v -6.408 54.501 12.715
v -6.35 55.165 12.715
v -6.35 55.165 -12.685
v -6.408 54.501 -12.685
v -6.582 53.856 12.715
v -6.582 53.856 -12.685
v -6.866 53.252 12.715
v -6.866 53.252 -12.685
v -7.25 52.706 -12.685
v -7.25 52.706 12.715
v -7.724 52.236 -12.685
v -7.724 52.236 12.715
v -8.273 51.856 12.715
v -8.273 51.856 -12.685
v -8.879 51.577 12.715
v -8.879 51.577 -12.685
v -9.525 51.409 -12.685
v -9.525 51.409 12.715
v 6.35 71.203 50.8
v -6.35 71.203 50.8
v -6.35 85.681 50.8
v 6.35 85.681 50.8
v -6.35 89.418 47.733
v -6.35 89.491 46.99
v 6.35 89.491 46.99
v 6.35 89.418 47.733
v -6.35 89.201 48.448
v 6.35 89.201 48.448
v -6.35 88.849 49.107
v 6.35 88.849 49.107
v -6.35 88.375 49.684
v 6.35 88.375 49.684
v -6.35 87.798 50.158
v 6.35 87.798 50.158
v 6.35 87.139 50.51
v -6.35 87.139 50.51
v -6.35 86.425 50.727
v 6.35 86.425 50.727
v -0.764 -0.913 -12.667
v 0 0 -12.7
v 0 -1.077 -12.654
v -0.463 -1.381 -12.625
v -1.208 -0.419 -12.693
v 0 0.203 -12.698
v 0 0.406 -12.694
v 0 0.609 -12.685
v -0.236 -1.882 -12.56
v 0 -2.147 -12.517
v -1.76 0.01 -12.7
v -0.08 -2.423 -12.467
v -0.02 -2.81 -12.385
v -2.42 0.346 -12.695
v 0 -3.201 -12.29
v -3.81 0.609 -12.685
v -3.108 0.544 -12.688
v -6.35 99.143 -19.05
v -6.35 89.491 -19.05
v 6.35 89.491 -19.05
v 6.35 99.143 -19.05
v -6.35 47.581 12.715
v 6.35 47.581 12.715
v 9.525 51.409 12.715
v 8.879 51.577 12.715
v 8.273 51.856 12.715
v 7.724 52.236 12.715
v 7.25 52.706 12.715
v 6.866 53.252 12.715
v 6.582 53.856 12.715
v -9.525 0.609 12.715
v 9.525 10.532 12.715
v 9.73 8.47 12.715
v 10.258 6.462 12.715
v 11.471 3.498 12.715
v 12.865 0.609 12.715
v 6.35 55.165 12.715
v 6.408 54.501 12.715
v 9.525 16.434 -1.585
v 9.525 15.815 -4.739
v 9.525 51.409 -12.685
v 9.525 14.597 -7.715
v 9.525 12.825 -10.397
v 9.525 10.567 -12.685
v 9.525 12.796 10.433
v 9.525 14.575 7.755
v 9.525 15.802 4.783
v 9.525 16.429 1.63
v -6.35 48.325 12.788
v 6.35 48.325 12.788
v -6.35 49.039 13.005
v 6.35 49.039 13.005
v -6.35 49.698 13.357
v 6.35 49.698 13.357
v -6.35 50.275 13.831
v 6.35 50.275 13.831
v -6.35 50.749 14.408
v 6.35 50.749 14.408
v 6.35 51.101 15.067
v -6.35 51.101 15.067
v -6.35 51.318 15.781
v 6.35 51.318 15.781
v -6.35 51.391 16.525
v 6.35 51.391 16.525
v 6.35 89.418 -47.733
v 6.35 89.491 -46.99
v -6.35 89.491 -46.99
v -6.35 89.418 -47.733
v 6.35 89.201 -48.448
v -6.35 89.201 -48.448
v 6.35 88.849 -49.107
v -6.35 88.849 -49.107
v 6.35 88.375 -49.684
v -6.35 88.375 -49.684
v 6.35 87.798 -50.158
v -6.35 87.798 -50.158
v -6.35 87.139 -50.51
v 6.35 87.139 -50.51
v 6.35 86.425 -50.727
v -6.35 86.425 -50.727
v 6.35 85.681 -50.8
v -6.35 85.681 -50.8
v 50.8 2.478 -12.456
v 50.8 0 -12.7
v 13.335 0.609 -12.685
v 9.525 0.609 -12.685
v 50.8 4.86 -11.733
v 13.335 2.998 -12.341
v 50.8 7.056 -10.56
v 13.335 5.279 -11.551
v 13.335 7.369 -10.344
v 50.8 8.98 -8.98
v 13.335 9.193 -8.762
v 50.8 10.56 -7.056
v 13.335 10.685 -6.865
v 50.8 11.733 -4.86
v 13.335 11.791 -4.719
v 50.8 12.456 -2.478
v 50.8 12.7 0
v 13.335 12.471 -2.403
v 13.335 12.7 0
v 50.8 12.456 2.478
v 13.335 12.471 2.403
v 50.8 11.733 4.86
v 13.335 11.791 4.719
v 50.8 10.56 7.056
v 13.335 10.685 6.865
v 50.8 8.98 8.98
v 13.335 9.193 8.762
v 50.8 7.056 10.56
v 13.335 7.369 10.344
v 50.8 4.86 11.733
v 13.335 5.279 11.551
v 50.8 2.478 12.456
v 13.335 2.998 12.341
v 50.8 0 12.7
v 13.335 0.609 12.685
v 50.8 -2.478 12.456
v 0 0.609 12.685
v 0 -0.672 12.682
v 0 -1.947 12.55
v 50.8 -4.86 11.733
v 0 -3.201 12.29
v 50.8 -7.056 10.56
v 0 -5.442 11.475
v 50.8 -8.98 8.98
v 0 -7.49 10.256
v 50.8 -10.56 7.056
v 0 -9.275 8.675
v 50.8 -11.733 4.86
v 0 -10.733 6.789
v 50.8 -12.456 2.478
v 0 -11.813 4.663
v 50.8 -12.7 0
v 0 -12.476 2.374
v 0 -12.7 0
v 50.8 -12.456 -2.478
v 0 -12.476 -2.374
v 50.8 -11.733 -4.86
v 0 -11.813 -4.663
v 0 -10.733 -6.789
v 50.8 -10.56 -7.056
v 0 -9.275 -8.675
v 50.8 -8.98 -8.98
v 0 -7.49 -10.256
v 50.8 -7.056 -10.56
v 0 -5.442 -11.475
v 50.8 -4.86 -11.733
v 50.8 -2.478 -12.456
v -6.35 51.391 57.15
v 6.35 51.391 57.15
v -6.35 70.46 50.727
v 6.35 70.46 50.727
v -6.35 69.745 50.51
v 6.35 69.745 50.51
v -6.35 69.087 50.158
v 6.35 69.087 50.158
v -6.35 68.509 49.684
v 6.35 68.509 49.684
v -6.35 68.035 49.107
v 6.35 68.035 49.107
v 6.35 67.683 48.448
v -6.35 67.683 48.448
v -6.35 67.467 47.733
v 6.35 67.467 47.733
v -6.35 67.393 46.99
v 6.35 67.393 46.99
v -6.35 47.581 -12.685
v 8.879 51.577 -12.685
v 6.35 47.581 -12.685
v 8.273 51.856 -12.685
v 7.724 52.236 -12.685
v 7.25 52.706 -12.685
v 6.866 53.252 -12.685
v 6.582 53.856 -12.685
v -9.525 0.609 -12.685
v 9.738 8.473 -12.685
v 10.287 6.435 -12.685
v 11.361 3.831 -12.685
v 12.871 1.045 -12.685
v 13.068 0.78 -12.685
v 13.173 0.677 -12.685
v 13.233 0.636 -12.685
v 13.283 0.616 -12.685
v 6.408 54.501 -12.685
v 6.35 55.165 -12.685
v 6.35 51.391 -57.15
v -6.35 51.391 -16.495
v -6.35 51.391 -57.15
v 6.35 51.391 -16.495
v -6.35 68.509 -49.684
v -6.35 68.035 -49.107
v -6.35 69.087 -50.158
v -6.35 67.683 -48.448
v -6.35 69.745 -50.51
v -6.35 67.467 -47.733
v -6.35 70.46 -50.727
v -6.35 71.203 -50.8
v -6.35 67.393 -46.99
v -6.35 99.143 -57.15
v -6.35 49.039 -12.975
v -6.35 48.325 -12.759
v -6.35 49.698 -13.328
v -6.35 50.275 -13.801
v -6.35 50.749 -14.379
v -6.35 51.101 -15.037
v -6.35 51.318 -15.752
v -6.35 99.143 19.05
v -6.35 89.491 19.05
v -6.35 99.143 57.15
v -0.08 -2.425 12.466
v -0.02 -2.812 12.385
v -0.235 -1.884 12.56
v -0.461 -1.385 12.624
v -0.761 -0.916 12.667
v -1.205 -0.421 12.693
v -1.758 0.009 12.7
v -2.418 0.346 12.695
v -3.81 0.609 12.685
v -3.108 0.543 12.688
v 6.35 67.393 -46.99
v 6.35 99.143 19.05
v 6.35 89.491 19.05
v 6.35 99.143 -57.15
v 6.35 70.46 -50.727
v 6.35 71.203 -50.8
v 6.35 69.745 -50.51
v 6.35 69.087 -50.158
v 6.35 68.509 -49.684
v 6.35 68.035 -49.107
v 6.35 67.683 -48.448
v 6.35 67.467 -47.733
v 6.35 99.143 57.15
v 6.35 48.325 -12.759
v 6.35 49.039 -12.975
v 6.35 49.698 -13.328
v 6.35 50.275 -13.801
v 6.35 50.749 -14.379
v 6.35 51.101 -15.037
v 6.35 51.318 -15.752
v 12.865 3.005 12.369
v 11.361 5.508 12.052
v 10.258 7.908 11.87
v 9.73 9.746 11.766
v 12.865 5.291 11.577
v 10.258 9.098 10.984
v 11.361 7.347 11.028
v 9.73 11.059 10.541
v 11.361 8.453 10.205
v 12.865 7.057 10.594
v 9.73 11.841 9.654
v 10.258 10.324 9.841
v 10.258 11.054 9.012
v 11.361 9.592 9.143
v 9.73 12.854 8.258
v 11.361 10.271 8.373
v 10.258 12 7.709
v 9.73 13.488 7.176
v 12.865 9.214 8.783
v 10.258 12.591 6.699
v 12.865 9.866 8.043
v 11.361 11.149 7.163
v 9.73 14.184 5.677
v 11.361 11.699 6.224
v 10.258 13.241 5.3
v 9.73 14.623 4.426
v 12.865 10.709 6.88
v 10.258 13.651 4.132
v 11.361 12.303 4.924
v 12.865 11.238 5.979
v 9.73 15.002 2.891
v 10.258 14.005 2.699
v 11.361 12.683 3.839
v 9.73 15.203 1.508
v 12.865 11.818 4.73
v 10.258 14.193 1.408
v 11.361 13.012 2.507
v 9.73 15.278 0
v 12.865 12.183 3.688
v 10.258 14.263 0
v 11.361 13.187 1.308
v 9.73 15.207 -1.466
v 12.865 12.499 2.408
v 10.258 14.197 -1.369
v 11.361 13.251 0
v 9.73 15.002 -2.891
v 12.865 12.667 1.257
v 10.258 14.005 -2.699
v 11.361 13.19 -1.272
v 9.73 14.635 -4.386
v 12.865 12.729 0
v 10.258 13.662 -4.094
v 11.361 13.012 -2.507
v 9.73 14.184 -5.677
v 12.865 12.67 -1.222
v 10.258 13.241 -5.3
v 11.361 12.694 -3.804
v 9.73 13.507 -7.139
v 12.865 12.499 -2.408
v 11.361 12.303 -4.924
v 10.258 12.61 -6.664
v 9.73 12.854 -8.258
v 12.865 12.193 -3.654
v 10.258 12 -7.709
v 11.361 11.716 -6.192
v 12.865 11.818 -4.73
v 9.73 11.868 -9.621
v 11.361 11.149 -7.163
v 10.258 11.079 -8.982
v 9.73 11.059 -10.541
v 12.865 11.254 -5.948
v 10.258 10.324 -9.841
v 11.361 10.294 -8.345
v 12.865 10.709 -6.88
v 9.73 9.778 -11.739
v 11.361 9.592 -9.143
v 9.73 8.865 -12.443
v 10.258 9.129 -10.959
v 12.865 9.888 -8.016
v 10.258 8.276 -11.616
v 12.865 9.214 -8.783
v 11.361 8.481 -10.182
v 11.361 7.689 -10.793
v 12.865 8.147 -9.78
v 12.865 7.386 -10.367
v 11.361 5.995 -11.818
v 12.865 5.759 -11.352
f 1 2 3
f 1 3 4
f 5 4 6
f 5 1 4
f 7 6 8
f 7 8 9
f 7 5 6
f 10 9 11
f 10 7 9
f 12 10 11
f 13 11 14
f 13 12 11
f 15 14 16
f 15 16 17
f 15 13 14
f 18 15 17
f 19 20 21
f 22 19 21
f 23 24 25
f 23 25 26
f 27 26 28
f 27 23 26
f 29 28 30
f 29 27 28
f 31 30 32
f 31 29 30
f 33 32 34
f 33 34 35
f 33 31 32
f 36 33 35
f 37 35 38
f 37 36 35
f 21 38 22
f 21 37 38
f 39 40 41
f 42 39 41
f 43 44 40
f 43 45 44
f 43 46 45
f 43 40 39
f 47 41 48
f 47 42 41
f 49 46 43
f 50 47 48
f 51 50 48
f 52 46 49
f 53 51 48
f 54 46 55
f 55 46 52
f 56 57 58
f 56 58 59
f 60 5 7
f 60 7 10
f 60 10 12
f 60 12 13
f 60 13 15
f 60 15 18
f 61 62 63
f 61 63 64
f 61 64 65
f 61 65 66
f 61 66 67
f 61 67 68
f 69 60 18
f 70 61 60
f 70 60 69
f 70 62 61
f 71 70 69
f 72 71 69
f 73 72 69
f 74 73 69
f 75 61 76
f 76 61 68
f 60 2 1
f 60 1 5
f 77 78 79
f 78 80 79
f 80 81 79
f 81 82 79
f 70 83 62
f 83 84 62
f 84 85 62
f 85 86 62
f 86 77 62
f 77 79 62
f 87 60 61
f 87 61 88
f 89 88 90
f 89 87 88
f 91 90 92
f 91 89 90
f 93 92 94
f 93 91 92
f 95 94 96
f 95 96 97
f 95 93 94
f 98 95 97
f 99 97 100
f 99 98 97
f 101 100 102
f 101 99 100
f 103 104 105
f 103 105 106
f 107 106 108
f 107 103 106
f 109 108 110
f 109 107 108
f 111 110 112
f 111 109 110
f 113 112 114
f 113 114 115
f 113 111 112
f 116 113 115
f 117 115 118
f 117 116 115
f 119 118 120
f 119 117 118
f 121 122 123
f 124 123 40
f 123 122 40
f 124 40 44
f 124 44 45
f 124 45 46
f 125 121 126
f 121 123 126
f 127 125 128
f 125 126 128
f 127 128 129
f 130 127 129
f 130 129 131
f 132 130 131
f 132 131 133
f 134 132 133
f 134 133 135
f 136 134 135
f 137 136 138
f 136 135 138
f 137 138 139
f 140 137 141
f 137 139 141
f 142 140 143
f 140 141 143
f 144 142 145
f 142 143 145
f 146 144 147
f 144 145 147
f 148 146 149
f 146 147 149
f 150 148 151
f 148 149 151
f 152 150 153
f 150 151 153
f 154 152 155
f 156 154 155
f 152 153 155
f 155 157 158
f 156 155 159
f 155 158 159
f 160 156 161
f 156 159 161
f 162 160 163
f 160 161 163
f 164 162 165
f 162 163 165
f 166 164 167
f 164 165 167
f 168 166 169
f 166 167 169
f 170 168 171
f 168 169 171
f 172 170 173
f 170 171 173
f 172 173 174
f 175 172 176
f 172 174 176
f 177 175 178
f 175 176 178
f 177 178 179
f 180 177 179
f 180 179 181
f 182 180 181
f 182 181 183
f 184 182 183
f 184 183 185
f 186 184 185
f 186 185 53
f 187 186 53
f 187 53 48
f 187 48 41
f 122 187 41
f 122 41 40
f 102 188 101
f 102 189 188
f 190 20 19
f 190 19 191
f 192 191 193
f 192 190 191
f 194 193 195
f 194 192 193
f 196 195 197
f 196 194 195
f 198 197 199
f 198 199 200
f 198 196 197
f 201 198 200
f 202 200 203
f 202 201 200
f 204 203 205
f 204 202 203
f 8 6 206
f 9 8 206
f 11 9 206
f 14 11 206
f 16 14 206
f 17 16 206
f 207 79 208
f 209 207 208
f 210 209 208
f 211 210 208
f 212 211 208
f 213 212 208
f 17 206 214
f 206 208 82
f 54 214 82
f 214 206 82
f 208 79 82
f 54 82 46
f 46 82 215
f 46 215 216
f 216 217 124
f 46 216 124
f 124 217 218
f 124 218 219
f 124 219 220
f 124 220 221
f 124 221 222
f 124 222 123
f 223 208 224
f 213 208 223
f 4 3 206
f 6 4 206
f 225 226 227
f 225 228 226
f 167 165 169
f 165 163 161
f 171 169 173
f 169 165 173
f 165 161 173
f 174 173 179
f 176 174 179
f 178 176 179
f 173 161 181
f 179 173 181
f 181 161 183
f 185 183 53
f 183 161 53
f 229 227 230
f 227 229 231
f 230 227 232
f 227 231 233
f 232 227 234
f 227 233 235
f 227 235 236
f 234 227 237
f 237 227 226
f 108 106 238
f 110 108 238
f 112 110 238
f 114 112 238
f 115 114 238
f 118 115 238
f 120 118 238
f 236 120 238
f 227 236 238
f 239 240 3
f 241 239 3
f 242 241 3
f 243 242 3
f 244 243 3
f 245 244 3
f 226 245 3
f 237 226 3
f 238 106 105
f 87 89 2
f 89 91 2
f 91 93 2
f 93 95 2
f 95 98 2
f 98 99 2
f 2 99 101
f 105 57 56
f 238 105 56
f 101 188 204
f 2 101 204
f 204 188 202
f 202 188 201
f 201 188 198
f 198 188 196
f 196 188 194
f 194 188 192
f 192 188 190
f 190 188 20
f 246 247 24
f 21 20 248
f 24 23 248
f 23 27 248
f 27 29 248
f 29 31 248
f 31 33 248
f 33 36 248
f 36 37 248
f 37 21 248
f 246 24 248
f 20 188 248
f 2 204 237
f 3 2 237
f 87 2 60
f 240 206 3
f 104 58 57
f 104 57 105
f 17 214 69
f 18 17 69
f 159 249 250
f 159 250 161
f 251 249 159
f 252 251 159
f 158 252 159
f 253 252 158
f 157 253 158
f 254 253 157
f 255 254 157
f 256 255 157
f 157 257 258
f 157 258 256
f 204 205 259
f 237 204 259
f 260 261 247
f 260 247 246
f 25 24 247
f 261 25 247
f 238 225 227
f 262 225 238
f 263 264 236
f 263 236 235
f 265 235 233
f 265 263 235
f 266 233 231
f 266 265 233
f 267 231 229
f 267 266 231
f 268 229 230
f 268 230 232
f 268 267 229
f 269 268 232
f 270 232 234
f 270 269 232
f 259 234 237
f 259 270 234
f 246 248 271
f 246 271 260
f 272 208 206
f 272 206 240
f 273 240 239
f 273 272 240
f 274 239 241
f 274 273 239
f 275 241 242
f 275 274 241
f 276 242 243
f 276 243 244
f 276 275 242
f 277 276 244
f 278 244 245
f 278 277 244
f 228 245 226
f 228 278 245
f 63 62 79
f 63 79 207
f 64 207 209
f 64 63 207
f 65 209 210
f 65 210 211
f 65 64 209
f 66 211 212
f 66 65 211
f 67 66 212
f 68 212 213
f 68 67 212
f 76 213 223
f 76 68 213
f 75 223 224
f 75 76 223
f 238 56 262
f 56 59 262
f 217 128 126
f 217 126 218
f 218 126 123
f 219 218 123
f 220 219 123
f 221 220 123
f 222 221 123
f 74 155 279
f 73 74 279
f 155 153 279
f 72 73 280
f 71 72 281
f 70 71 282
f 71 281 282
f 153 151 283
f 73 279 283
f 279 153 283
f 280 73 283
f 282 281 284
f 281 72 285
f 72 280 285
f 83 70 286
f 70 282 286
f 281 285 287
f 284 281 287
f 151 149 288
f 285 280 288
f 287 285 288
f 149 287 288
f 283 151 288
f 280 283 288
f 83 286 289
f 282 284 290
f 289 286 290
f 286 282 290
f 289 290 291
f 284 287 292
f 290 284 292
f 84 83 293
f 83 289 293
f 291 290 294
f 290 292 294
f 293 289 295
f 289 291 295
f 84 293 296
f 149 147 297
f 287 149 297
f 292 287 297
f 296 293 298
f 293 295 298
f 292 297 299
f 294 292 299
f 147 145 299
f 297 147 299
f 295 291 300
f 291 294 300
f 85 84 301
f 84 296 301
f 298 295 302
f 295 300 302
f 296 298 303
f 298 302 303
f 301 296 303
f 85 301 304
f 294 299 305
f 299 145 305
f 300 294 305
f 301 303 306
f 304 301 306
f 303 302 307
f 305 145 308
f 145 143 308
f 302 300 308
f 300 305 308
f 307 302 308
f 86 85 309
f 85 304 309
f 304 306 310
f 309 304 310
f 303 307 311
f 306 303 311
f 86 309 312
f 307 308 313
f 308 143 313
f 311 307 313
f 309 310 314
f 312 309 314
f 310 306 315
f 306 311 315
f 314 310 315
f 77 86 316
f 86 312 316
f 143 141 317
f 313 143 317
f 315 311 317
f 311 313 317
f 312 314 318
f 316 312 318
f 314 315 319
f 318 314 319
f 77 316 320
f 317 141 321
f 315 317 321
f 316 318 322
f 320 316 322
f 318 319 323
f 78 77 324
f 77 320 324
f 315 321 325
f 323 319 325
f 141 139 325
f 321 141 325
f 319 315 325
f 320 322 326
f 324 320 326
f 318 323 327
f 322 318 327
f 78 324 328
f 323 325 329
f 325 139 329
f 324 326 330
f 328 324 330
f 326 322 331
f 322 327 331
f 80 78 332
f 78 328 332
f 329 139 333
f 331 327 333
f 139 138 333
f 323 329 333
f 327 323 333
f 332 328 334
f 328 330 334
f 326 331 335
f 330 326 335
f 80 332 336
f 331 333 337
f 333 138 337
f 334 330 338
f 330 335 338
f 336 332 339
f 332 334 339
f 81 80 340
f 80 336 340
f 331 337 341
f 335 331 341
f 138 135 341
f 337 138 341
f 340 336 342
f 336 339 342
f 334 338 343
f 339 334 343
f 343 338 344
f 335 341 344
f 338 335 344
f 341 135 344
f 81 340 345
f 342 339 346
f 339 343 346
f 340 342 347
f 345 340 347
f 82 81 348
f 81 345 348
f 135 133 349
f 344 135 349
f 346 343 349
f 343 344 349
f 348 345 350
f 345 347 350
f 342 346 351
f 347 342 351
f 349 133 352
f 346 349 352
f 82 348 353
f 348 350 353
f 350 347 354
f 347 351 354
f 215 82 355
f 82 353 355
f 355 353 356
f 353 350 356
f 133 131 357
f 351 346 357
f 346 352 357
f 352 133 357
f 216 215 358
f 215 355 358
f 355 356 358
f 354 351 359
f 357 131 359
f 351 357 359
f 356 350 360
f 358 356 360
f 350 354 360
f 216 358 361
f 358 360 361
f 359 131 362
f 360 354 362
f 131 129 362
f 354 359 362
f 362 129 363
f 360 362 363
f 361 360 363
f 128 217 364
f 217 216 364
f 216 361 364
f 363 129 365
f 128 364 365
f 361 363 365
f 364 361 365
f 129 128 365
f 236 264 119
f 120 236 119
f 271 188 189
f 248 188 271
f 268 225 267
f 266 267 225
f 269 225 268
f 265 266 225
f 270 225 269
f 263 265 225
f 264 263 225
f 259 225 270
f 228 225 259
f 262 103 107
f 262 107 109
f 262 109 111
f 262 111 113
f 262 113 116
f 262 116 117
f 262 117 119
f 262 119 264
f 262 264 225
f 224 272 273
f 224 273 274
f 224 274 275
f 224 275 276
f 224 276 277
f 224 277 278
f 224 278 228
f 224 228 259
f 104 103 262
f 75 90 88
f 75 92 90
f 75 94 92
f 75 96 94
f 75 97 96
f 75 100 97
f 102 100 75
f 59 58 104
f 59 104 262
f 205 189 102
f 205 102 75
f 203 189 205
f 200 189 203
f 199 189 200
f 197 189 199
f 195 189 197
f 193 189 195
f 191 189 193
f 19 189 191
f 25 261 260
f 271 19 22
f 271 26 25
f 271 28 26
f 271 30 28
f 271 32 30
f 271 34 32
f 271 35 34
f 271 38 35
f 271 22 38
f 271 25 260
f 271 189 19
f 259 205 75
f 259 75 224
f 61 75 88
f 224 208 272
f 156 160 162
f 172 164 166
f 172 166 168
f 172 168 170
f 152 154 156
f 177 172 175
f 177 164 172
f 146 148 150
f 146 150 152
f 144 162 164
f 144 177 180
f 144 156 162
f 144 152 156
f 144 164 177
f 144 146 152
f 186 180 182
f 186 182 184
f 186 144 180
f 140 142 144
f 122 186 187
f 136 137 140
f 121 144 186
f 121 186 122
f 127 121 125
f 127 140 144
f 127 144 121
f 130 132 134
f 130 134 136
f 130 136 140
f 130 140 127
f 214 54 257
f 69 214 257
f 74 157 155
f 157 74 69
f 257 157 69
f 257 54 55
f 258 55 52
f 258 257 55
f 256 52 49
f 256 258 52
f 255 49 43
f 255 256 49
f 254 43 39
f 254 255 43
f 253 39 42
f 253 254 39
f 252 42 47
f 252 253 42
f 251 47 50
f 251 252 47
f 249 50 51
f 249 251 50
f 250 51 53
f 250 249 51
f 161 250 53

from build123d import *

# Parameters (mm, degrees)
SKETCH2_R           = 12.7
BOSS_EXTRUDE1_DEPTH = 50.8
SKETCH3_W           = 25.4
SKETCH3_H           = 50.8
BOSS_EXTRUDE2_DEPTH = 9.525
SKETCH5_W           = 101.6
SKETCH5_H           = 16.002
BOSS_EXTRUDE3_DEPTH = 6.35
SKETCH6_W           = 6.35
SKETCH6_H           = 38.1
BOSS_EXTRUDE4_DEPTH = 6.35
SKETCH7_W           = 38.1
SKETCH7_H           = 9.652
BOSS_EXTRUDE5_DEPTH = 6.35
FILLET1_R           = 3.81
FILLET2_R           = 3.81


with BuildPart() as part:
    # Sketch2 → Boss-Extrude1 (new body)
    with BuildSketch(Plane(origin=(0, 0, 0), x_dir=(0, 0, -1), z_dir=(1, 0, 0))):
        Circle(SKETCH2_R)
    extrude(amount=BOSS_EXTRUDE1_DEPTH)

    # Sketch3 → Boss-Extrude2 (add, symmetric)
    with BuildSketch(Plane.ZY):
        with Locations((0.014597196, 26.008732875)):
            Rectangle(SKETCH3_W, SKETCH3_H)
    extrude(amount=BOSS_EXTRUDE2_DEPTH, both=True)


with BuildPart() as body_2:
    # Sketch5 → Boss-Extrude3 (new, symmetric)
    with BuildSketch(Plane(origin=(0, 0, 0), x_dir=(0, 0, -1), z_dir=(1, 0, 0))):
        with Locations((0, 59.392294155)):
            Rectangle(SKETCH5_W, SKETCH5_H)
    extrude(amount=BOSS_EXTRUDE3_DEPTH, both=True)

    # Sketch6 → Boss-Extrude4 (add, symmetric)
    with BuildSketch(Plane(origin=(0, 0, 0), x_dir=(0, 0, -1), z_dir=(1, 0, 0))):
        with Locations((-53.975, 70.441294155)):
            Rectangle(SKETCH6_W, SKETCH6_H)
        with Locations((53.975, 70.441294155)):
            Rectangle(SKETCH6_W, SKETCH6_H)
    extrude(amount=BOSS_EXTRUDE4_DEPTH, both=True)

    # Sketch7 → Boss-Extrude5 (add, symmetric)
    with BuildSketch(Plane(origin=(0, 0, 0), x_dir=(0, 0, -1), z_dir=(1, 0, 0))):
        with Locations((-38.1, 94.317294155)):
            Rectangle(SKETCH7_W, SKETCH7_H)
        with Locations((38.1, 94.317294155)):
            Rectangle(SKETCH7_W, SKETCH7_H)
    extrude(amount=BOSS_EXTRUDE5_DEPTH, both=True)


with BuildPart() as part_1:
    add(part.part)

    # Combine1: union body 2
    add(body_2.part)

    # Fillet1
    # the kernel refuses this fillet: 3.81 mm, written as the material it adds along each edge
    with BuildSketch(Plane(origin=(-6.35, 51.391294155, 12.714597196), x_dir=(0, -1, 0), z_dir=(1, 0, 0)), Plane(origin=(6.35, 51.391294155, -12.685402804), x_dir=(0, -1, 0), z_dir=(-1, 0, 0)), Plane(origin=(6.35, 67.393294155, -50.8), x_dir=(0, 1, 0), z_dir=(-1, 0, 0)), Plane(origin=(-6.35, 89.491294155, 50.8), x_dir=(0, 0, -1), z_dir=(1, 0, 0)), Plane(origin=(-6.35, 67.393294155, 50.8), x_dir=(0, 1, 0), z_dir=(1, 0, 0))) as fillet1_piece_1:
        with BuildLine():
            CenterArc((FILLET1_R, -FILLET1_R), FILLET1_R, 90, 90)
            Line((0, -FILLET1_R), (0, 0))
            Line((0, 0), (FILLET1_R, 0))
        make_face()
    extrude(amount=12.7)
    with BuildSketch(Plane(origin=(9.525, 0, 0), x_dir=(0, -0.6466492608489325, 0.762787475935158), z_dir=(0, -0.762787475935158, -0.6466492608489325))) as fillet1_piece_2_section:
        with BuildLine():
            CenterArc((12.7 + FILLET1_R, -FILLET1_R), FILLET1_R, 90, 90)
            Line((12.7 + FILLET1_R, 0), (12.7, 0))
            Line((12.7, 0), (12.7, -FILLET1_R))
        make_face()
    fillet1_piece_2 = revolve(axis=Axis((9.525, 0, 0), (-1, 0, 0)), revolution_arc=260.578888602, mode=Mode.PRIVATE)
    fillet1_piece_2 = split(fillet1_piece_2, bisect_by=Plane(origin=(10.607555303, 13.782555283, -12.685402804), z_dir=(0, 0, 1)), keep=Keep.TOP, mode=Mode.PRIVATE)
    fillet1_piece_2 = split(fillet1_piece_2, bisect_by=Plane(origin=(10.607555303, 0.608732875, 0.000757571), z_dir=(0, 1, 0)), keep=Keep.TOP, mode=Mode.PRIVATE)
    fillet1_piece_2 = split(fillet1_piece_2, bisect_by=Plane(origin=(10.607555303, 13.782555283, 12.714597196), z_dir=(0, 0, -1)), keep=Keep.TOP, mode=Mode.PRIVATE)
    add(fillet1_piece_2)
    with BuildSketch(Plane(origin=(6.35, 89.491294155, -50.8), x_dir=(0, -1, 0), z_dir=(-1, 0, 0))) as fillet1_piece_3:
        with BuildLine():
            CenterArc((FILLET1_R, FILLET1_R), FILLET1_R, 180, 90)
            Line((0, FILLET1_R), (0, 0))
            Line((0, 0), (FILLET1_R, 0))
        make_face()
    extrude(amount=12.7)

    # Fillet2
    # the kernel refuses this fillet: 3.81 mm, written as the material it adds along each edge
    with BuildSketch(Plane(origin=(0, 0.608732875, 22.210402804), x_dir=(-1, 0, 0), z_dir=(0, 0, -1))) as fillet2_piece_1_section:
        with BuildLine():
            CenterArc((FILLET2_R, -FILLET2_R), FILLET2_R, 90, 90)
            Line((0, -FILLET2_R), (0, 0))
            Line((0, 0), (FILLET2_R, 0))
        make_face()
    fillet2_piece_1 = extrude(amount=44.420805607, mode=Mode.PRIVATE)
    fillet2_piece_1 = fillet2_piece_1 & Plane(origin=(-0.851863451, 0, 0), x_dir=(0, 0, -1), z_dir=(-1, 0, 0)) * Cylinder(12.7, 105, mode=Mode.PRIVATE)
    add(fillet2_piece_1)
    with BuildSketch(Plane(origin=(-6.35, 51.408732875, 12.714597196), x_dir=(0, 1, 0), z_dir=(0, 0, -1))) as fillet2_piece_2:
        with BuildLine():
            CenterArc((3.756710662, -3.81), FILLET2_R, 90, 80.405931773)
            Line((0, -3.175), (0, 0))
            Line((0, 0), (3.756710662, 0))
        make_face()
    extrude(amount=25.4)
    with BuildSketch(Plane(origin=(6.35, 51.408732875, 12.714597196), x_dir=(0, 1, 0), z_dir=(0, 0, -1))) as fillet2_piece_3:
        with BuildLine():
            CenterArc((3.756710662, 3.81), FILLET2_R, 189.594068227, 80.405931773)
            Line((0, 3.175), (0, 0))
            Line((0, 0), (3.756710662, 0))
        make_face()
    extrude(amount=25.4)


solid = part_1.part
